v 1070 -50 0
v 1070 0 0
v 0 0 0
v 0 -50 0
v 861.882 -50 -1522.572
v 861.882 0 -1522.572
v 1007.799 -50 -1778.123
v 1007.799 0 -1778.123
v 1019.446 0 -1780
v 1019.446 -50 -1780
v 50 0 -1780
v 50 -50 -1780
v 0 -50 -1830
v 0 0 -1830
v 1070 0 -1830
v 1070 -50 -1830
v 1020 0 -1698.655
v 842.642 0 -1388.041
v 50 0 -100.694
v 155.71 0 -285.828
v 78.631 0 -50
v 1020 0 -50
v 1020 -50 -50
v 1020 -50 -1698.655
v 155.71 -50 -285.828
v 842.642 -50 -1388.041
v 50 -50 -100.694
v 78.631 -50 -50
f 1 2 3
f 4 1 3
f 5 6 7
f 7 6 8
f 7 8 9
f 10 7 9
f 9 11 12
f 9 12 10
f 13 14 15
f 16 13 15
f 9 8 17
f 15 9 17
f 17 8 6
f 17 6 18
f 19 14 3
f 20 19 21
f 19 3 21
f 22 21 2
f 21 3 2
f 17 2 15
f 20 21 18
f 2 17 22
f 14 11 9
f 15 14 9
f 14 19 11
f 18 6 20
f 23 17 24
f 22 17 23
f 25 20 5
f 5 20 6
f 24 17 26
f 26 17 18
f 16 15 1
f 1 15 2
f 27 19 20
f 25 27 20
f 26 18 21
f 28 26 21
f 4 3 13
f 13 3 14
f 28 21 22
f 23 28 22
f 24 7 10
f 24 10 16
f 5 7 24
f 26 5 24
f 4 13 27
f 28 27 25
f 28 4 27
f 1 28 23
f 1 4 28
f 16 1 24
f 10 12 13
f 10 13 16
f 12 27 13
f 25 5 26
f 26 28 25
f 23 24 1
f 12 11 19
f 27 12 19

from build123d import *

# Parameters (mm, degrees)
F0_W     = 970
F0_H     = 1730
F1_DEPTH = 50
F3_DEPTH = 50


with BuildPart() as f1:
    # F0 (on Front) → F1 (new body)
    with BuildSketch(Plane.XZ):
        Polygon((1020, 0), (0, 0), (0, -1830), (1070, -1830), (1070, 0), align=None)
        with Locations((535, -915)):
            Rectangle(F0_W, F0_H, mode=Mode.SUBTRACT)
    extrude(amount=F1_DEPTH)

    # F2 (on Front) → F3 (join)
    with BuildSketch(Plane.XZ):
        Polygon((1041.897844, -1737.005164), (842.641968, -1388.040984), (78.297675, -49.416571), (49.824655, -49.968854), (47.816185, -96.869479), (155.709775, -285.827511), (861.881588, -1522.572309), (1007.799248, -1778.123299), (1039.504766, -1783.232212), align=None)
    extrude(amount=F3_DEPTH)


solid = f1.part
